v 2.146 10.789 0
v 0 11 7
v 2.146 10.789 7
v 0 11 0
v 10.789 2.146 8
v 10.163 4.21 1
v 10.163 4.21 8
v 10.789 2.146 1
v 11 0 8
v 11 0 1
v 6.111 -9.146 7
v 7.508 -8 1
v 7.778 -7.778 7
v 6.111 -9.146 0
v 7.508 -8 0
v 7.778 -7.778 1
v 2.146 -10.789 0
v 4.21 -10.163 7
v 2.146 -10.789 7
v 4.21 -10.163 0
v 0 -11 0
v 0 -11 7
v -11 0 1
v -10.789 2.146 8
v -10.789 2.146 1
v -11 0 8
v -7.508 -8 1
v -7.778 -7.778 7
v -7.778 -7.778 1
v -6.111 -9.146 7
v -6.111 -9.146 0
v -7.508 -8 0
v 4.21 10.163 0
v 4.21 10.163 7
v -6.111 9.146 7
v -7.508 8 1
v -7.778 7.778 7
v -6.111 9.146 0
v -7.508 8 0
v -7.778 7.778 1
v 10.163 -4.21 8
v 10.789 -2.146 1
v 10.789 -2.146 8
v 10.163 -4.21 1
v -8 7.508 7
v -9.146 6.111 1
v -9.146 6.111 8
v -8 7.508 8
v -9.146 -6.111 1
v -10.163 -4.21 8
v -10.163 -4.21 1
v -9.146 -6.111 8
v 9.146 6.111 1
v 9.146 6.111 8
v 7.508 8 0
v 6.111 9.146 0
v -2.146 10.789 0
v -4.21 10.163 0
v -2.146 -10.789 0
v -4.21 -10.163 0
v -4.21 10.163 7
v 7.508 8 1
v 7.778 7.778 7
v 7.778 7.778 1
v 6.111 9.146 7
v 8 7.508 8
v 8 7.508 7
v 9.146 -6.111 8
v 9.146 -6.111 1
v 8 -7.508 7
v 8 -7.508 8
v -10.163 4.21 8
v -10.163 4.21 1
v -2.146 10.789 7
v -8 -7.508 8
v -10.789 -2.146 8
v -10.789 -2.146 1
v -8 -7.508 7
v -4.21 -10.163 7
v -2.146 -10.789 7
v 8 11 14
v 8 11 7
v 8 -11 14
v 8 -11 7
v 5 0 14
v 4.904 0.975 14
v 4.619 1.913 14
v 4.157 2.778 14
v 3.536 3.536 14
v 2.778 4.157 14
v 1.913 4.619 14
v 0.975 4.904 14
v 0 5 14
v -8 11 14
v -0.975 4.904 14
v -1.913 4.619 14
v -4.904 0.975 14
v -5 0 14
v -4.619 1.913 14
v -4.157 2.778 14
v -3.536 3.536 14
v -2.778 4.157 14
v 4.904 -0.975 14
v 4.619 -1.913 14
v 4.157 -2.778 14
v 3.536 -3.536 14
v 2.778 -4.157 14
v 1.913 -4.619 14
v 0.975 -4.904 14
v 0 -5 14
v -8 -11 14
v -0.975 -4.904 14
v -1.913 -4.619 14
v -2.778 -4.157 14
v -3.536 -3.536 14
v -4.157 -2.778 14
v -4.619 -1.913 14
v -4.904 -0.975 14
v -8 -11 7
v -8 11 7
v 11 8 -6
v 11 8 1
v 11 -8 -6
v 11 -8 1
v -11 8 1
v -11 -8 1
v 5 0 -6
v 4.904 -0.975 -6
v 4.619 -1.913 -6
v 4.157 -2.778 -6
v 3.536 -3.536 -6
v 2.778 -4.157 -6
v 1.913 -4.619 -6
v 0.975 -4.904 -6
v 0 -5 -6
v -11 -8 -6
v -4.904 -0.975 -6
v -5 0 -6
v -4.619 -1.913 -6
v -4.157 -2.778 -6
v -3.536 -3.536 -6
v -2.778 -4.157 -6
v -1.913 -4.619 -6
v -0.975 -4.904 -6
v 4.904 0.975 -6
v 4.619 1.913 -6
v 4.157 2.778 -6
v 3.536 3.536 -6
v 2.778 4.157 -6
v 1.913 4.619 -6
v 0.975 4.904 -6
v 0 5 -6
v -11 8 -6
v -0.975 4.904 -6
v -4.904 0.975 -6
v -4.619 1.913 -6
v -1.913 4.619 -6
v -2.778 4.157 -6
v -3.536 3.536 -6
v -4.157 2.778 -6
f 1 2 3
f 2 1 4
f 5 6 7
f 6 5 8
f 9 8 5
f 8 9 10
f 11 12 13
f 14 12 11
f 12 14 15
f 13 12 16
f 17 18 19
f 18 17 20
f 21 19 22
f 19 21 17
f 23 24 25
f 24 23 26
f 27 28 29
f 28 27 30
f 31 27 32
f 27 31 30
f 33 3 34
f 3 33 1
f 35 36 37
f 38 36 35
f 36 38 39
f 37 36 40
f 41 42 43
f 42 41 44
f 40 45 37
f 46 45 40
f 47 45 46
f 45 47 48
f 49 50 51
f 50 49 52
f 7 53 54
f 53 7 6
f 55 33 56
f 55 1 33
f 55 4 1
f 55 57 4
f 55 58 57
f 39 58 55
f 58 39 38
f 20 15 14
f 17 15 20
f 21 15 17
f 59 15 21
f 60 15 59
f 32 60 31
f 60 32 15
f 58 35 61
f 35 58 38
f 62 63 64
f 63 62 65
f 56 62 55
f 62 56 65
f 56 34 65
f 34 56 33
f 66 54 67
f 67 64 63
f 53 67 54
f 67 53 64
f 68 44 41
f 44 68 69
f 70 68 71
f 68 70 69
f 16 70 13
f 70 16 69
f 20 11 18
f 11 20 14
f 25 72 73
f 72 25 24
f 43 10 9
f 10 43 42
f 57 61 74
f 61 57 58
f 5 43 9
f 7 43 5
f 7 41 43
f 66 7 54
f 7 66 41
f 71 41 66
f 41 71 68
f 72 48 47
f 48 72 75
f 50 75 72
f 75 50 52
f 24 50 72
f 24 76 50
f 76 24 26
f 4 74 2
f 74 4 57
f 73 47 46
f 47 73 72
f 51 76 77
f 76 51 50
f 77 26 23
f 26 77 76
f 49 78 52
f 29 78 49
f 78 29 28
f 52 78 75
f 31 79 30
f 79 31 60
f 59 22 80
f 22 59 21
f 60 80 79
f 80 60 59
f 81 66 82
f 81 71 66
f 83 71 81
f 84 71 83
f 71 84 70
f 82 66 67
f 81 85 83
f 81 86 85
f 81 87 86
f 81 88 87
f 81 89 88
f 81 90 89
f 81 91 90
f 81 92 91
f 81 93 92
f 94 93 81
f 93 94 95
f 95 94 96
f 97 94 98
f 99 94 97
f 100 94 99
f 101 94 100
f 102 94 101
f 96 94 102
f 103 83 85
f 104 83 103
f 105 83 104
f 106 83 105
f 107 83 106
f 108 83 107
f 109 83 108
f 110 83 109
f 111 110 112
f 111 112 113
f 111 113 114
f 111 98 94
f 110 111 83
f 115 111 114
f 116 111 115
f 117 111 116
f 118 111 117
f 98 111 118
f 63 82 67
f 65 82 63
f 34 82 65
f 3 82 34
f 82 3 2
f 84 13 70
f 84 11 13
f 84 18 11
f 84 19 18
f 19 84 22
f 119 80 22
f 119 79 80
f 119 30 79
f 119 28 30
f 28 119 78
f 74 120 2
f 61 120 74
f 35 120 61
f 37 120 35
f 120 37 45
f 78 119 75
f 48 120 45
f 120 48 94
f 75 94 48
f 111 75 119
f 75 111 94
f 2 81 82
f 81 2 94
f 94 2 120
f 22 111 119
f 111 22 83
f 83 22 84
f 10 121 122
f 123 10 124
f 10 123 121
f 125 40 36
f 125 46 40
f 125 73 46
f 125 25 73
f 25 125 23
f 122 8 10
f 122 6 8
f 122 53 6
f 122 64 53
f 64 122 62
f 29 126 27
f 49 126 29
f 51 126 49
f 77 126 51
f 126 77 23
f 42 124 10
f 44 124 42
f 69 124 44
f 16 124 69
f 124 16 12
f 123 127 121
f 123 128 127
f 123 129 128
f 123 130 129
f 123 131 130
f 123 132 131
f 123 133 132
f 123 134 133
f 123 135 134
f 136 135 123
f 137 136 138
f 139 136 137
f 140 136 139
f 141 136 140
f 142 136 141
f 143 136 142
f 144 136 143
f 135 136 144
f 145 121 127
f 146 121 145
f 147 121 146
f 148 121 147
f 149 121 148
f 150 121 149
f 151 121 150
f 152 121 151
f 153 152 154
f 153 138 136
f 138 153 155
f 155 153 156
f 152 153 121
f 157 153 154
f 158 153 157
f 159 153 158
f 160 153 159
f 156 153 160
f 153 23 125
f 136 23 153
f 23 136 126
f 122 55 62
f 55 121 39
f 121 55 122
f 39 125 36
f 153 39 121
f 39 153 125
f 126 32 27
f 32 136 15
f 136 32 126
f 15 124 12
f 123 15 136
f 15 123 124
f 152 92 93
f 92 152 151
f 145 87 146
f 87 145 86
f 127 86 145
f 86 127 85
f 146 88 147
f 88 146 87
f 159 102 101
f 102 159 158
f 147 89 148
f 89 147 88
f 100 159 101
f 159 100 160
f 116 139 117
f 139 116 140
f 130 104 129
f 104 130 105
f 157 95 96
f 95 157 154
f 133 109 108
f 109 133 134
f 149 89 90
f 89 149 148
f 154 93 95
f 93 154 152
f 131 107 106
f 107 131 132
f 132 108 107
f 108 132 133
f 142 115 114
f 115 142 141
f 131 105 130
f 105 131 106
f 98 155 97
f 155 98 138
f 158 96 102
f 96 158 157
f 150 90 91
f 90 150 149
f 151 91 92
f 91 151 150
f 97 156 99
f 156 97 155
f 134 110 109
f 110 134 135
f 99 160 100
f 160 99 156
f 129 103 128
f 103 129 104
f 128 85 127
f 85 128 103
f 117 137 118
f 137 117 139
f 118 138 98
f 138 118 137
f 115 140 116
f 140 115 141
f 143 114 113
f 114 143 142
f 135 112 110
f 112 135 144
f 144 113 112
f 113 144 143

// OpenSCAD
$fn = 32;

// ----------------------------------------------------------------------
// Oldham coupling disc: 22 x 20 mm
// ----------------------------------------------------------------------

// --- parameters (mm) ---
disc_d = 22;              // disc diameter
disc_t = 8;               // disc thickness
tongue_w = 16;            // tongue width
tongue_h = 6;             // tongue height
bore_d = 10;              // centre lightening bore

module disc() {
  cylinder(h = disc_t, d = disc_d);
  /* tongue on the top face, sunk 1 mm into the disc */
  translate([-tongue_w / 2, -disc_d / 2, disc_t - 1]) cube([tongue_w, disc_d, tongue_h + 1]);
  /* slot wall on the bottom face, 90 degrees turned */
  translate([-disc_d / 2, -tongue_w / 2, -tongue_h]) cube([disc_d, tongue_w, tongue_h + 1]);
}

difference() {
  disc();
  translate([0, 0, -tongue_h - 1]) cylinder(h = disc_t + 2 * tongue_h + 2, d = bore_d);
}
